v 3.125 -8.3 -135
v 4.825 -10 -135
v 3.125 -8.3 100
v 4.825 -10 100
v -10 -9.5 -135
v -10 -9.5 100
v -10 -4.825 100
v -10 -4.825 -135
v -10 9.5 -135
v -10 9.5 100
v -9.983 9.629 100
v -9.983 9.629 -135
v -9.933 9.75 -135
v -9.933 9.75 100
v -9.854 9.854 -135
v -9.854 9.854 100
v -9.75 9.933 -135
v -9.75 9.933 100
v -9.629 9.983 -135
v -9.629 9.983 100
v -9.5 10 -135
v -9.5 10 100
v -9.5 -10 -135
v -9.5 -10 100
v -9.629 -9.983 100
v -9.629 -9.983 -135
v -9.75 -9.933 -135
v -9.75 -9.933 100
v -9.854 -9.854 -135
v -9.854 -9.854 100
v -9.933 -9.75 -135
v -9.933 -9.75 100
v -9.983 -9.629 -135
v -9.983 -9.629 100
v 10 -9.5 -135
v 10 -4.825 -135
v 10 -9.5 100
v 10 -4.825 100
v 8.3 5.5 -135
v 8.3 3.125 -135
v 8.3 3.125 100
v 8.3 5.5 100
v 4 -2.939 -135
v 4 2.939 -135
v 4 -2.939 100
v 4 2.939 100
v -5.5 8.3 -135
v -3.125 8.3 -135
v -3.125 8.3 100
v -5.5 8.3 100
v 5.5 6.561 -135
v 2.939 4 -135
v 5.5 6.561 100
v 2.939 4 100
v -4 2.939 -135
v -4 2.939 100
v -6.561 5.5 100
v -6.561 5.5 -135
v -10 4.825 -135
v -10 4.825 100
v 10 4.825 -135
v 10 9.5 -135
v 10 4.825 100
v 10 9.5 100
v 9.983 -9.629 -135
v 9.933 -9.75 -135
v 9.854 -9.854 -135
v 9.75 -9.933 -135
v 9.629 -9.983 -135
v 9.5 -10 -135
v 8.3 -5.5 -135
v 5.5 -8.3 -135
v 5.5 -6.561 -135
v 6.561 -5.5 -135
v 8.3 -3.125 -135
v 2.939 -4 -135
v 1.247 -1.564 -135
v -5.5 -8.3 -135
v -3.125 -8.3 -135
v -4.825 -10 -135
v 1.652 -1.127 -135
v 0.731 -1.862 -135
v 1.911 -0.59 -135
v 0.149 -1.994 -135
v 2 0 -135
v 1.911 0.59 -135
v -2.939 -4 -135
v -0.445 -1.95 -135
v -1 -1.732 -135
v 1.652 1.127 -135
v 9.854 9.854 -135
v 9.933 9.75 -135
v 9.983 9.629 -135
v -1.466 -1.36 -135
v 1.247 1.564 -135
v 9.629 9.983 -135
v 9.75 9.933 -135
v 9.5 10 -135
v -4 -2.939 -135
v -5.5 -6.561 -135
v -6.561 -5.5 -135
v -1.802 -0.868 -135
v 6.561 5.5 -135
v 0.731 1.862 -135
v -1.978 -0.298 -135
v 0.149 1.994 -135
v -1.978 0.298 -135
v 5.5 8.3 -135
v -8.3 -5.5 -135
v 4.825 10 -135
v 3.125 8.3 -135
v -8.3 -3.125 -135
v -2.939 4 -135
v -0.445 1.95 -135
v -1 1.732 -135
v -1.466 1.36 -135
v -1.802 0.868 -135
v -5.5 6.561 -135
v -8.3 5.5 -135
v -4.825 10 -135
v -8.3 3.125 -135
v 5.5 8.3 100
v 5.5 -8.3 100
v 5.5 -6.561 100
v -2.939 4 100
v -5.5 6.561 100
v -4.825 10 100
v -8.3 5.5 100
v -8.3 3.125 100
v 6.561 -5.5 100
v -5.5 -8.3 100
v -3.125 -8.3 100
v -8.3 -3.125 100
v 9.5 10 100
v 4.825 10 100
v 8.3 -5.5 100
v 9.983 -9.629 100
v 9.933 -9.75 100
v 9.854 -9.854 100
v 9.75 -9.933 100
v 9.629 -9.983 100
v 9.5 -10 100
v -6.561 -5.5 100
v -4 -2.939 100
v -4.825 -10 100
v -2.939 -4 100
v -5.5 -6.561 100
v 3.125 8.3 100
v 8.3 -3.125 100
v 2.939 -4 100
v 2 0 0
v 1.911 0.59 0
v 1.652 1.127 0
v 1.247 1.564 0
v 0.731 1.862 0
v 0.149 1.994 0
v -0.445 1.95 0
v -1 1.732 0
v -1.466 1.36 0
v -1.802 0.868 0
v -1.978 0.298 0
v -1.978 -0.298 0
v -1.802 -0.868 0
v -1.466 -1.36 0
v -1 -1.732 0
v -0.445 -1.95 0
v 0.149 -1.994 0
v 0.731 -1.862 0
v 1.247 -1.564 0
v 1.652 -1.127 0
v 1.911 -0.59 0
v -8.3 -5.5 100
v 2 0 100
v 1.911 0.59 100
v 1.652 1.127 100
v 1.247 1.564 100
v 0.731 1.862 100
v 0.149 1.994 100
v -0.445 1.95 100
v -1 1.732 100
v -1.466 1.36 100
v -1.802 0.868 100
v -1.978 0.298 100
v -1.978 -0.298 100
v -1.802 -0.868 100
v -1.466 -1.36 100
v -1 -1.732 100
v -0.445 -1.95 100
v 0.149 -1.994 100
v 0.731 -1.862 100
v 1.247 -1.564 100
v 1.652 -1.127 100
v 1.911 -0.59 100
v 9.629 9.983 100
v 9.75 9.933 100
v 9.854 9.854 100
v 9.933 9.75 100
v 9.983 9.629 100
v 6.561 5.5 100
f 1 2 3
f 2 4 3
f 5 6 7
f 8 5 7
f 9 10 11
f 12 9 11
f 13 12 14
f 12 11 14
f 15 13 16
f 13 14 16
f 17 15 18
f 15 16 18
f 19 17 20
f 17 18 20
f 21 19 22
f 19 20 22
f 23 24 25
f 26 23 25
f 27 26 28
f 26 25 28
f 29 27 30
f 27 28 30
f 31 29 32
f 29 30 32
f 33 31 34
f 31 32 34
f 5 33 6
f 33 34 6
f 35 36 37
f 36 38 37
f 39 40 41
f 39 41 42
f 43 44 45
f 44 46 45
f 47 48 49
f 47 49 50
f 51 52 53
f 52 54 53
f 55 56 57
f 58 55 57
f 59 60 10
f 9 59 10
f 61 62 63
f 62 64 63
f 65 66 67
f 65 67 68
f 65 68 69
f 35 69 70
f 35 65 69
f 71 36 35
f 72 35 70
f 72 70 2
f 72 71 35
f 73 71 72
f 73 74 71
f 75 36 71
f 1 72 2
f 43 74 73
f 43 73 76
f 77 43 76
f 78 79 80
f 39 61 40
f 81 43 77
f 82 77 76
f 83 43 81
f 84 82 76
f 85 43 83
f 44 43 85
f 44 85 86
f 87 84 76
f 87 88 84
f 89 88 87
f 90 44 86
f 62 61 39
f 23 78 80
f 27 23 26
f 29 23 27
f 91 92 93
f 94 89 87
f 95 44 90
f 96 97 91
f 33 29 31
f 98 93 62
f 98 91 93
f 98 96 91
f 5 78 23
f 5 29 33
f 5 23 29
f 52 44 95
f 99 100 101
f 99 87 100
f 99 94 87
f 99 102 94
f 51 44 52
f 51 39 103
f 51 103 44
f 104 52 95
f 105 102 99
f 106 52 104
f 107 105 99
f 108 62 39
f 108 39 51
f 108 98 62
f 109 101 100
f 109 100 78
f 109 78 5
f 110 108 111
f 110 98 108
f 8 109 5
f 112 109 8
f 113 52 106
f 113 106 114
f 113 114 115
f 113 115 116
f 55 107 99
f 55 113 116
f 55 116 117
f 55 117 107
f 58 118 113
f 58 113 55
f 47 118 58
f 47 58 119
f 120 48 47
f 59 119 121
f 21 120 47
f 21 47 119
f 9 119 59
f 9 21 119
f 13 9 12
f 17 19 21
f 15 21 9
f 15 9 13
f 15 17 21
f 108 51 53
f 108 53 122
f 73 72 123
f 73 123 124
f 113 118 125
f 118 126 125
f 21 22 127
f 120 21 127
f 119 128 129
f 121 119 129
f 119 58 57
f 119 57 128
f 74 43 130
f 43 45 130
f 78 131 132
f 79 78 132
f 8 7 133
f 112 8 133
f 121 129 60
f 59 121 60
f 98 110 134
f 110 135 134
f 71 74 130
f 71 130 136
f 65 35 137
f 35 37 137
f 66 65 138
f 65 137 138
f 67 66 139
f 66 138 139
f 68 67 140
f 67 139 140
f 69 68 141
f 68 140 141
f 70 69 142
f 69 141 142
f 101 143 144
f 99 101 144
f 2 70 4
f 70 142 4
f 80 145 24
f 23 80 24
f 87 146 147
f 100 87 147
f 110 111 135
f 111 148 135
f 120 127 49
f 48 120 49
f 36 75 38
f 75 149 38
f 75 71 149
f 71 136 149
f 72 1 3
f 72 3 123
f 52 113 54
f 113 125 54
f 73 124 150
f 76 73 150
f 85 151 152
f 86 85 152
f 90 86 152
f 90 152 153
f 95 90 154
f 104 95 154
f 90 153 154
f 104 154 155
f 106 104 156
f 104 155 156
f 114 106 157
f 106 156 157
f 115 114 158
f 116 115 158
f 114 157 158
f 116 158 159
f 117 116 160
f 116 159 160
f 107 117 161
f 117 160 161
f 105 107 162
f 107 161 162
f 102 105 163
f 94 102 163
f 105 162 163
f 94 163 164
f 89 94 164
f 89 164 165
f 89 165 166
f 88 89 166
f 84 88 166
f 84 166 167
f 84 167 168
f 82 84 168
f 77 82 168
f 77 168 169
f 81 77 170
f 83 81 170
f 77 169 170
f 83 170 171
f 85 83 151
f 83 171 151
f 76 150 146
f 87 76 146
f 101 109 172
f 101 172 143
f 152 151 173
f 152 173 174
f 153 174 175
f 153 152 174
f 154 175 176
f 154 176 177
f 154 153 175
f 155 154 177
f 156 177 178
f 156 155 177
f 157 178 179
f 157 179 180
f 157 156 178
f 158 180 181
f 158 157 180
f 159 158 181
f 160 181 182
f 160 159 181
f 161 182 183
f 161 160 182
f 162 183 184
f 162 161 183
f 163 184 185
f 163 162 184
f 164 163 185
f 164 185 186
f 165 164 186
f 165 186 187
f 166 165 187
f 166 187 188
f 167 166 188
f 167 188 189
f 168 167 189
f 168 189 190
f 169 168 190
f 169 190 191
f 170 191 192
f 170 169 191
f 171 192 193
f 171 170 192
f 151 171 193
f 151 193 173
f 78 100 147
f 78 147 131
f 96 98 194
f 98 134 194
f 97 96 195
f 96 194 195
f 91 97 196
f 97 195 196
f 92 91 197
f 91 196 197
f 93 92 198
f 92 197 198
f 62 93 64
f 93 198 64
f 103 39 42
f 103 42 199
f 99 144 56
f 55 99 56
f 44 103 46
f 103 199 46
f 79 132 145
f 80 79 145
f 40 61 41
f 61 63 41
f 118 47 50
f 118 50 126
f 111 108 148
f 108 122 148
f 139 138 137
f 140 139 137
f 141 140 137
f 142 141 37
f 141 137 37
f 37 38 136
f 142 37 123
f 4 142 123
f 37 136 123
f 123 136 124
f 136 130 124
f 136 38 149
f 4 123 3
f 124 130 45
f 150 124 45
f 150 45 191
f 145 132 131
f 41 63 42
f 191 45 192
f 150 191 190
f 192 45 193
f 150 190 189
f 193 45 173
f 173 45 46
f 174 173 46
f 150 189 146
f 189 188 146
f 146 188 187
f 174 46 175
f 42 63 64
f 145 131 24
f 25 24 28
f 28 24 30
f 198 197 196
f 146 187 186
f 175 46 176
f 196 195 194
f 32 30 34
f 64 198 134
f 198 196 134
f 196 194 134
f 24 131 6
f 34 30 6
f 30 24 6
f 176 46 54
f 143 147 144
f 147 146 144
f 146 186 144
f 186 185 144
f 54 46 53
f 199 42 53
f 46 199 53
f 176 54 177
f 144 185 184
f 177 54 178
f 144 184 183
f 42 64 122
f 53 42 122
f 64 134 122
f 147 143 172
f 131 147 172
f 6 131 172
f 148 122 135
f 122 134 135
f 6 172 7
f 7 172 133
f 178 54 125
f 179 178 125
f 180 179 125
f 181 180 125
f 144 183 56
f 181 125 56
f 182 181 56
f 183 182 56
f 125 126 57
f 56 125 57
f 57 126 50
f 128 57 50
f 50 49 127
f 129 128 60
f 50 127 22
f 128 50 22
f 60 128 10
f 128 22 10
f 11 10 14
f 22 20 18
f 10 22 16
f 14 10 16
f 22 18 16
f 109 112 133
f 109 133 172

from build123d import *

# Parameters (mm, degrees)
CROQUIS1_R              = 2
SALIENTE_EXTRUIR2_DEPTH = 100
MOVE_FACE_1_BY          = 135


with BuildPart() as part:
    # Croquis1 → Saliente-Extruir2 (new body)
    with BuildSketch(Plane.XY):
        with BuildLine():
            Line((-4.825, 10), (-3.125, 8.3))
            Line((-3.125, 8.3), (-5.5, 8.3))
            Line((-5.5, 8.3), (-5.5, 6.560660172))
            Line((-5.5, 6.560660172), (-2.939339828, 4))
            Line((-2.939339828, 4), (2.939339828, 4))
            Line((2.939339828, 4), (5.5, 6.560660172))
            Line((5.5, 6.560660172), (5.5, 8.3))
            Line((5.5, 8.3), (3.125, 8.3))
            Line((3.125, 8.3), (4.825, 10))
            Line((4.825, 10), (9.5, 10))
            ThreePointArc((9.5, 10), (9.853553391, 9.853553391), (10, 9.5))
            Line((10, 9.5), (10, 4.825))
            Line((10, 4.825), (8.3, 3.125))
            Line((8.3, 3.125), (8.3, 5.5))
            Line((8.3, 5.5), (6.560660172, 5.5))
            Line((6.560660172, 5.5), (4, 2.939339828))
            Line((4, 2.939339828), (4, -2.939339828))
            Line((4, -2.939339828), (6.560660172, -5.5))
            Line((6.560660172, -5.5), (8.3, -5.5))
            Line((8.3, -5.5), (8.3, -3.125))
            Line((8.3, -3.125), (10, -4.825))
            Line((10, -4.825), (10, -9.5))
            ThreePointArc((10, -9.5), (9.853553391, -9.853553391), (9.5, -10))
            Line((9.5, -10), (4.825, -10))
            Line((4.825, -10), (3.125, -8.3))
            Line((3.125, -8.3), (5.5, -8.3))
            Line((5.5, -8.3), (5.5, -6.560660172))
            Line((5.5, -6.560660172), (2.939339828, -4))
            Line((2.939339828, -4), (-2.939339828, -4))
            Line((-2.939339828, -4), (-5.5, -6.560660172))
            Line((-5.5, -6.560660172), (-5.5, -8.3))
            Line((-5.5, -8.3), (-3.125, -8.3))
            Line((-3.125, -8.3), (-4.825, -10))
            Line((-4.825, -10), (-9.5, -10))
            ThreePointArc((-9.5, -10), (-9.853553391, -9.853553391), (-10, -9.5))
            Line((-10, -9.5), (-10, -4.825))
            Line((-10, -4.825), (-8.3, -3.125))
            Line((-8.3, -3.125), (-8.3, -5.5))
            Line((-8.3, -5.5), (-6.560660172, -5.5))
            Line((-6.560660172, -5.5), (-4, -2.939339828))
            Line((-4, -2.939339828), (-4, 2.939339828))
            Line((-4, 2.939339828), (-6.560660172, 5.5))
            Line((-6.560660172, 5.5), (-8.3, 5.5))
            Line((-8.3, 5.5), (-8.3, 3.125))
            Line((-8.3, 3.125), (-10, 4.825))
            Line((-10, 4.825), (-10, 9.5))
            ThreePointArc((-10, 9.5), (-9.853553391, 9.853553391), (-9.5, 10))
            Line((-9.5, 10), (-4.825, 10))
        make_face()
        Circle(CROQUIS1_R, mode=Mode.SUBTRACT)
    extrude(amount=SALIENTE_EXTRUIR2_DEPTH)

    # Move Face 1: a face moved outward by 135.0
    extrude(part.faces().sort_by_distance((5, -5, 0))[0], amount=MOVE_FACE_1_BY, dir=(0, 0, -1))


solid = part.part
